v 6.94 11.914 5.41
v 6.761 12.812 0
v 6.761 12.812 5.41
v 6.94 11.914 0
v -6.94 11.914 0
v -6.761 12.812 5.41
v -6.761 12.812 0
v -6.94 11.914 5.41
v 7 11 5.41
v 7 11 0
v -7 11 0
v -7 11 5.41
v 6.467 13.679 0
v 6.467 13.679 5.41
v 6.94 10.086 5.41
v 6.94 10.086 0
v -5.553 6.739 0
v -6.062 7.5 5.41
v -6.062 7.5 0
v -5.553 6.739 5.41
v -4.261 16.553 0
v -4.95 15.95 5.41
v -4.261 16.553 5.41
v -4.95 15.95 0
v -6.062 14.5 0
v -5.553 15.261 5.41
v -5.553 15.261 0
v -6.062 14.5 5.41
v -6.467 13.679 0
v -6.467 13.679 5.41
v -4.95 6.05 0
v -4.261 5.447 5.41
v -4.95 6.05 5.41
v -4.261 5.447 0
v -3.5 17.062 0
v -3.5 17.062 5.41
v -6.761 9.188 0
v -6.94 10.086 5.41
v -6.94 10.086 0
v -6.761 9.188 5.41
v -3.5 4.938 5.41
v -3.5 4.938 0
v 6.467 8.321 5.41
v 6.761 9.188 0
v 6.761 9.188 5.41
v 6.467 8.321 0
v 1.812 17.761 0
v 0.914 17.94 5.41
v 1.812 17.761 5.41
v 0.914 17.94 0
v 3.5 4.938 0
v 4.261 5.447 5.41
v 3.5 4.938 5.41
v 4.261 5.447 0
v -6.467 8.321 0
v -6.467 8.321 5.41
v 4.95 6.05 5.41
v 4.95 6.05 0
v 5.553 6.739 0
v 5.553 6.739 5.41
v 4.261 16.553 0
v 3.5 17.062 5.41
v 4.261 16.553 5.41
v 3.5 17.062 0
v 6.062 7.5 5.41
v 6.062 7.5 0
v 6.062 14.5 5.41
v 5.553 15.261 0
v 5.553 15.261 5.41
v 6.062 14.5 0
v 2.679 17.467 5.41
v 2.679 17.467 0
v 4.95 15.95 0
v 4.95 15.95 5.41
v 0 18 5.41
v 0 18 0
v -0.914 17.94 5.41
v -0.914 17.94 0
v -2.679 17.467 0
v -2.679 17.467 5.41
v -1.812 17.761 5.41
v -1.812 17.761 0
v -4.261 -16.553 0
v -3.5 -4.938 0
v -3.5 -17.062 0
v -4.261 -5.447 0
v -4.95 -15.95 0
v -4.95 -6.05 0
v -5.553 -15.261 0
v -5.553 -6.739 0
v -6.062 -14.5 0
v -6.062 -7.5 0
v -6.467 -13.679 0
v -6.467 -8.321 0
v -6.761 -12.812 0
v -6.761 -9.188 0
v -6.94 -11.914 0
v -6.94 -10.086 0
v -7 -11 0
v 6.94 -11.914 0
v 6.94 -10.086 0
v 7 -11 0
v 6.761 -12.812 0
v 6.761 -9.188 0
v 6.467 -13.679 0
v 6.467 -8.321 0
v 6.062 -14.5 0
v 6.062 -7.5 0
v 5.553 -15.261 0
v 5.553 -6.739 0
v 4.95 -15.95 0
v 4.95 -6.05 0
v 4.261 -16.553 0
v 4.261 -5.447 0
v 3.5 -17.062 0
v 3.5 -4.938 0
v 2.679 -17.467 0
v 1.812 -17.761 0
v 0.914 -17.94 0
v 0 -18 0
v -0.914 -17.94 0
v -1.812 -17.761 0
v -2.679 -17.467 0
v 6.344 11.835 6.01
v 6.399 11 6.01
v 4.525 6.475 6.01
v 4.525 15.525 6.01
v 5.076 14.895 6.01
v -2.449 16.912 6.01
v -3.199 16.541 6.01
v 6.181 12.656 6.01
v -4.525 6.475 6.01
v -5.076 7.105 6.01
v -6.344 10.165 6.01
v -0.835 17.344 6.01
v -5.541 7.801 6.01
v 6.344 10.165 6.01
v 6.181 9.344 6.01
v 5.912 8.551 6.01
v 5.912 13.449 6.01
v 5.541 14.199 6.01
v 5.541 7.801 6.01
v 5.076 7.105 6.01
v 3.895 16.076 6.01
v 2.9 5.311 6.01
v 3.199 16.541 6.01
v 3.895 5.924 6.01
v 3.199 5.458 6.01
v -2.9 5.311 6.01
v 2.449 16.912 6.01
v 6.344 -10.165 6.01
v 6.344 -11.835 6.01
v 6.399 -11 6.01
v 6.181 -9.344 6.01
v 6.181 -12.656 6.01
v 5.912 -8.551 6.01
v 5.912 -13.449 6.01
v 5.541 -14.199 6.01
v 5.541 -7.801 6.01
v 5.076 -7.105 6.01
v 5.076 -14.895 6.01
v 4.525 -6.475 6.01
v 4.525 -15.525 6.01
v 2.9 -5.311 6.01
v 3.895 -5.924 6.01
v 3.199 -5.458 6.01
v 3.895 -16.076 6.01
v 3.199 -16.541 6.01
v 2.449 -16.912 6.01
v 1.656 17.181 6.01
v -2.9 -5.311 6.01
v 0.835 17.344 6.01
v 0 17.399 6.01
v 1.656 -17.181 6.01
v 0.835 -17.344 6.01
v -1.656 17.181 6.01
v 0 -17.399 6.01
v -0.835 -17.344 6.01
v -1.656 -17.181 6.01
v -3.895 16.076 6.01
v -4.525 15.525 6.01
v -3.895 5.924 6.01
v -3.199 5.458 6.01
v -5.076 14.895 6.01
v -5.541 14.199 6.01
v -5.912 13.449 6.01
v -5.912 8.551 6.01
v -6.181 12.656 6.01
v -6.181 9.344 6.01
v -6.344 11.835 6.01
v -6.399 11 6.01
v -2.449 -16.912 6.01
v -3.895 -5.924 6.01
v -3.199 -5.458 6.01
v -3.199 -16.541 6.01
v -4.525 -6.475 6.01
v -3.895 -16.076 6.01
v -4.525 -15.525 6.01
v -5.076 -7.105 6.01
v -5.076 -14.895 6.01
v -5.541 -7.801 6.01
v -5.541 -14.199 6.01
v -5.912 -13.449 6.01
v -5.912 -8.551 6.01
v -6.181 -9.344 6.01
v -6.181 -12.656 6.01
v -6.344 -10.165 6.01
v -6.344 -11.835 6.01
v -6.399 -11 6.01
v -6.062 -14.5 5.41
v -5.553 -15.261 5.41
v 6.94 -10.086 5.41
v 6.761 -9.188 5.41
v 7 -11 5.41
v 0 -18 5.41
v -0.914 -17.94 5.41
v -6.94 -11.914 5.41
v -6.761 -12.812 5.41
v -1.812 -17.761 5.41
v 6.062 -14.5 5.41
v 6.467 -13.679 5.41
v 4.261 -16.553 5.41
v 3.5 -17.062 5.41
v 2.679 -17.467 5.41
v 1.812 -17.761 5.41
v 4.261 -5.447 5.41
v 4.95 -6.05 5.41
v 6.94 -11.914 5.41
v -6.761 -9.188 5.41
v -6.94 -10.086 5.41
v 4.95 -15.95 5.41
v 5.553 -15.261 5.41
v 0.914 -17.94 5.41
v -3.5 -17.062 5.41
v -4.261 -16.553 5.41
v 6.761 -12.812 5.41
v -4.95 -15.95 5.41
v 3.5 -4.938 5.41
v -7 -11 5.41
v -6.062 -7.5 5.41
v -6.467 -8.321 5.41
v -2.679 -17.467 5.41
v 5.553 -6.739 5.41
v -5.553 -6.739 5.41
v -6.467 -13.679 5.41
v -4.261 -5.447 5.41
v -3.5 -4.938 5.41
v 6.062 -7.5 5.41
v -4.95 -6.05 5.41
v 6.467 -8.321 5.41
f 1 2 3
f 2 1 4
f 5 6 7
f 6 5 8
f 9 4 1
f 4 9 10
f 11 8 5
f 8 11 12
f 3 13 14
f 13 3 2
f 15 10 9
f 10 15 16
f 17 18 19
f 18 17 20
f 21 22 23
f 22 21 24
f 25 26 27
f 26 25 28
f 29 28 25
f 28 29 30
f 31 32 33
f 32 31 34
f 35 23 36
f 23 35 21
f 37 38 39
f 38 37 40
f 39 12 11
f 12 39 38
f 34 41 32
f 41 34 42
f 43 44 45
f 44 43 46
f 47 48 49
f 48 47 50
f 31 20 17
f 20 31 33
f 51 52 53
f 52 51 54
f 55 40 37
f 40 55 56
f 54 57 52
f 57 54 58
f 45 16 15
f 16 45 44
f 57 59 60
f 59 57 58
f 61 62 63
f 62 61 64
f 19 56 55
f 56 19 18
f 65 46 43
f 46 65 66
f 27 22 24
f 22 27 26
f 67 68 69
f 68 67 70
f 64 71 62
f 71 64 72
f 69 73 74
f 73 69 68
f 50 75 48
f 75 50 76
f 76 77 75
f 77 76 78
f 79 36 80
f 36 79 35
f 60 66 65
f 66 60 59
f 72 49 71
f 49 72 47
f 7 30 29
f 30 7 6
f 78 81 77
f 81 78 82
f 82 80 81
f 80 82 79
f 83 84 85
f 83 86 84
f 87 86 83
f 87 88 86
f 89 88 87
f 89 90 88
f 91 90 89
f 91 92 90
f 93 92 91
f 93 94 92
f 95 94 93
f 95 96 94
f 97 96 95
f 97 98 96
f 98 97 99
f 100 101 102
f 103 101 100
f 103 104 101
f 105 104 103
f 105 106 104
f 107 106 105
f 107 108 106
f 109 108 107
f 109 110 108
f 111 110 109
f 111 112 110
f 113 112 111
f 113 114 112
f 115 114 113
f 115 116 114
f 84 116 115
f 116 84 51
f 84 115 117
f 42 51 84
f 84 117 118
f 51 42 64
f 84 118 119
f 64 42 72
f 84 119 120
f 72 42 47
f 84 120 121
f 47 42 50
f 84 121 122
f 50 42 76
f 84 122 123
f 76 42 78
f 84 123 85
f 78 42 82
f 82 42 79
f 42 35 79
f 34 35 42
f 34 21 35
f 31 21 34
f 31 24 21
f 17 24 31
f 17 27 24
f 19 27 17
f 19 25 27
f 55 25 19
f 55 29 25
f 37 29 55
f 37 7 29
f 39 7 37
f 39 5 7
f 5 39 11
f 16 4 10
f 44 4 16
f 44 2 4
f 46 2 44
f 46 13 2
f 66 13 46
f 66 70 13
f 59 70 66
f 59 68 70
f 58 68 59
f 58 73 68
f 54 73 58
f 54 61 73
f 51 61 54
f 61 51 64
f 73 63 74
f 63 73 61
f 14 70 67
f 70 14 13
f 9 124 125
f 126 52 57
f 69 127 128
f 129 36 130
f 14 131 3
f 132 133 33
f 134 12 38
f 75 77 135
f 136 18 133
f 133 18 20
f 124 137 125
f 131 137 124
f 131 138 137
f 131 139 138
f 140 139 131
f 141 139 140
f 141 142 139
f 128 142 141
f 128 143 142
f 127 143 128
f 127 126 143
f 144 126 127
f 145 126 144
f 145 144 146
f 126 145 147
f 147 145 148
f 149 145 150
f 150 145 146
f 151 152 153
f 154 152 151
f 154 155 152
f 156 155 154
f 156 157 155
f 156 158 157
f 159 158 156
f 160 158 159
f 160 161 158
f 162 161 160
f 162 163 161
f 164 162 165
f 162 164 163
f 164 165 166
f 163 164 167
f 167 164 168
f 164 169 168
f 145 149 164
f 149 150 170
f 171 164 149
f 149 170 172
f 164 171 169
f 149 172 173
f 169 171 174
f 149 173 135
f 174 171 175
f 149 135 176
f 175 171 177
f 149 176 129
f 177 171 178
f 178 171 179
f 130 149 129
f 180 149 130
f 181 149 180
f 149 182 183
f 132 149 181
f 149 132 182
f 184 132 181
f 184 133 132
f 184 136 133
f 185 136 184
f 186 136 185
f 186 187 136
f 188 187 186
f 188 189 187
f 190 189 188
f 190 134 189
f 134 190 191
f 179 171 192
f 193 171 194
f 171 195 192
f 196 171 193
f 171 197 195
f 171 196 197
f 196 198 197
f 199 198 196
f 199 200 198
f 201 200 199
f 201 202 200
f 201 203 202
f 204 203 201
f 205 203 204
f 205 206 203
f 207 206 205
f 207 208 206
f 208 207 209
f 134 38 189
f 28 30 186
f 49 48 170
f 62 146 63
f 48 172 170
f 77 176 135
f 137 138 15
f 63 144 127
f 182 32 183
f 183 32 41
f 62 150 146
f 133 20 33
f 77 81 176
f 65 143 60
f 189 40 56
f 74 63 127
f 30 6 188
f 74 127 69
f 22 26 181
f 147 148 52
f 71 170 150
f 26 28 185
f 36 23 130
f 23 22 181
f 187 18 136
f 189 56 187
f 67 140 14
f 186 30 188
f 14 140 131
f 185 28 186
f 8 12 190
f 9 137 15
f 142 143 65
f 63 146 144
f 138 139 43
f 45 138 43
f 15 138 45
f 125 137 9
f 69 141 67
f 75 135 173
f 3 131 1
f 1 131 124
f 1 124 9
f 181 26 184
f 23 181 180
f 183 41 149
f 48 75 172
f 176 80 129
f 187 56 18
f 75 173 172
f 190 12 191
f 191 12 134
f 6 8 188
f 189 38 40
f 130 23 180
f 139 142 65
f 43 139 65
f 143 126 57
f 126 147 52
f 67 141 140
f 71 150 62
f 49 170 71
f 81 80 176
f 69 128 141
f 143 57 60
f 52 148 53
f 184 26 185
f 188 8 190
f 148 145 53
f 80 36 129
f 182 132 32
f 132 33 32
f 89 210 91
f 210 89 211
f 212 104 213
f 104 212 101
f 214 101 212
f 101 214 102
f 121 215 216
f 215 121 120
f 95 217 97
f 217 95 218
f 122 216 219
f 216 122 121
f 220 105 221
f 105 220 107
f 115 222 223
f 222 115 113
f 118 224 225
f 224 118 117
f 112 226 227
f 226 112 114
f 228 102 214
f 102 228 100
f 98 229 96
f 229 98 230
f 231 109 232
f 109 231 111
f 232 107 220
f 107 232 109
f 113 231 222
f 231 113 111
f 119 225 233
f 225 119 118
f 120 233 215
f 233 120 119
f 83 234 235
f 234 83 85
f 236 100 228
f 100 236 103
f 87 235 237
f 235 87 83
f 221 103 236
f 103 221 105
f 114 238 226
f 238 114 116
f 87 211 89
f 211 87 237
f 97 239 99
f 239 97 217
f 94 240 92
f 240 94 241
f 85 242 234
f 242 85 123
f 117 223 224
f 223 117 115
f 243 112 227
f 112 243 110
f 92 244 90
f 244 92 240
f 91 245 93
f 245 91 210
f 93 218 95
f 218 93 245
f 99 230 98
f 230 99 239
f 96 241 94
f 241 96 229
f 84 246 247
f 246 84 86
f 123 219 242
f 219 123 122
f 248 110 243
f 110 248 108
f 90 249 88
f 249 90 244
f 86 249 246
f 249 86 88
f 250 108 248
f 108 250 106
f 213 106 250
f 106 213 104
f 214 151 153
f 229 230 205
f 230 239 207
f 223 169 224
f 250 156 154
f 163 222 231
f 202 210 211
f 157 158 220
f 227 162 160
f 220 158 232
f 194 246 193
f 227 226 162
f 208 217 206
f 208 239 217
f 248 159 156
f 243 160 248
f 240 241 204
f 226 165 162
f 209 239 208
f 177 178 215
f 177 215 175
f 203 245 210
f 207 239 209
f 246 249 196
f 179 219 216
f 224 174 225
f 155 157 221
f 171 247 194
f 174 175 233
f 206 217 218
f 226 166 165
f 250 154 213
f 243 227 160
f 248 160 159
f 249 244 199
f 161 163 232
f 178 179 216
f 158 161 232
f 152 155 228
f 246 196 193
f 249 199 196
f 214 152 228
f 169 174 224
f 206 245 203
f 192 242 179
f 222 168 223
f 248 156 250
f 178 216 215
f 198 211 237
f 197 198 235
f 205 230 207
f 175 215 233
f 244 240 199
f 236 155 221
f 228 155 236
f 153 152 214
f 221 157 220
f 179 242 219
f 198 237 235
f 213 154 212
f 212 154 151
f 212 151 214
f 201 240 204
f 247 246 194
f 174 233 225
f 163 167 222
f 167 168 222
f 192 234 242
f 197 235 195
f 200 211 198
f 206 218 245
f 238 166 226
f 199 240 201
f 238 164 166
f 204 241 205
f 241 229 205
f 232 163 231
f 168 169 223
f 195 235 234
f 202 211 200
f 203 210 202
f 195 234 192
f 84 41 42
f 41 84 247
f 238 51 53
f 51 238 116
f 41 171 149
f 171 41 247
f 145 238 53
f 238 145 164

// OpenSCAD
// file: connector.scad
// Shared board-model geometry for the puzzle chess board.
//
// The cell, the pin and the platform all `include` this file so their
// mating dimensions can never drift apart. It defines named dimensions
// only (no top-level geometry), so including it renders nothing on its
// own. Three joints live here:
//   * cell <-> pin      : the dumbbell connector (bottom-loading grooves)
//   * cell <-> platform : the round central socket
//
// ---- Cell footprint ----
cell_size     = 50;   // square tile edge (mm) — a standard tournament cell
corner_radius = 5;    // radius of the rounded vertical corners

// ---- Clearance ----
// Fit control: every mating part differs from its cavity by this much on every
// face. A POSITIVE value is clearance (part shrunk — slides in with a gap); zero
// is a nominal (interference) fit that grips via FDM over-extrusion/roughness.
// Applied ONCE per joint — the cavity is drawn at its nominal size and the
// inserted part is offset by the gap. (Do not also resize the cavity; that
// double-counts the gap.)
// connector_gap is the default (platform joint); the pin uses its own pin_gap
// so the two joints can be tuned independently.
connector_gap = 0;  // platform disc: nominal (interference) fit, same as the pin.
                    // Clearances 0.1 / 0.05 / 0.02 per side all printed with
                    // side-to-side play, so grip on the nominal size instead.
pin_gap       = 0;     // pin-joint clearance per face — nominal (interference) fit,
                       // relies on FDM over-extrusion/roughness to grip firmly
// Deliberate gap left between two joined cells. The dumbbell's waist spans
// this gap, so small height differences between adjacent battlefield tiles
// read as natural seams rather than a visible step.
cell_gap      = 2;

// ---- Dumbbell connector: cell <-> pin ----
// A flat dumbbell-shaped tab lies in a pocket that is OPEN AT THE BOTTOM of
// each cell, so pins drop straight in (or out) from underneath the board —
// even for a tile in the middle of an assembled field, where the old
// side-sliding pin could never reach. Each cell captures one bulb of the
// dumbbell; the narrow waist passes through a slot at the cell's mid-edge,
// and because the bulb is wider than that slot the two cells cannot pull
// apart. All dimensions are the nominal cavity; the pin subtracts the gap.
bulb_radius  = 7;    // radius of each dumbbell head (14 mm across) — wider heads
                     //   give more shoulder behind the neck slot, resisting pull-out
neck_width   = 7;    // width of the waist — must be < 2*bulb_radius; wider = stronger
                     //   in shear, less likely to snap at the seam
groove_depth = 10;   // bulb-chamber centre, measured in from the cell edge; pulled a
                     //   touch deeper so a solid back wall remains behind the wider bulb
pin_thickness = 6;   // vertical (Z) extent of the flat tab — doubled for a much
                     //   stiffer, harder-to-snap connector
pin_top_chamfer    = 0.6;  // decorative bevel on the pin's TOP edge, matching the
                     // platform's top rim. The pin is modelled bevel-up; rotate it upside
                     // down for printing so the bevel lands on the bed. No effect on grip.
pin_bottom_chamfer = 0;    // bevel on the pin's bottom edge (0 = square)
// Vertical slack above the seated pin. Deliberately larger than the radial
// connector_gap: the pocket must be a touch DEEPER than the pin is thick so
// the pin can be pushed all the way in (its face flush with the board bottom)
// without the pocket roof stopping it short.
groove_clearance = 0.8;
// Pocket reaches from the bed (z = 0) up past the tab, leaving the cell body
// above it as a roof — set groove_clearance clear of the pin so it fully seats.
groove_height = pin_thickness + groove_clearance;
// Bulb-centre spacing on the pin: one groove_depth into each cell plus the
// seam gap, so a bulb lands dead-centre in each cell's chamber.
bulb_offset   = groove_depth + cell_gap / 2;

// ---- Central socket: cell <-> platform ----
// A round recess in the middle of the cell holds a separately printed
// platform (print it black or white) whose top finishes flush with the
// surrounding terrain plateau — the flat stage a piece stands on.
platform_radius  = 20;   // the platform disc (40 mm across) — clears a piece base
platform_height  = 4;    // its thickness / how deep it seats
platform_chamfer = 0;    // lead-in bevel on the platform's bottom edge (0 = straight
                         // wall, full radius top-to-bottom for maximum grip surface)
platform_top_chamfer = 0.6;  // decorative bevel on the platform's TOP (visible) edge,
                             // easing the rim where the stage meets the terrain plateau
                             // (like the pin's chamfer). Does not affect the socket grip.
socket_radius = platform_radius;                  // nominal cavity (disc carries the gap)
platform_fit_radius = platform_radius - connector_gap;  // friction fit in the cell
socket_depth  = platform_height + 0.2;            // seats flush or a hair below

$fn = 48;
// main file
// pin — the connector that joins two neighbouring cells. It is one of the
// three parts of the `board` model (the others are cell.scad and
// platform.scad).
//
// A flat dumbbell tab: one bulb seats in each cell's bottom-opening bulb
// chamber and the narrow waist spans the seam. Because each bulb is wider
// than the neck slot it passes through, the two cells cannot pull apart.
// Pins drop in (and out) from UNDER the board, so a tile in the middle of an
// assembled field can be added or removed without disturbing its neighbours.
//
// Prints flat on the bed, no supports. The pin is modelled with its decorative
// bevel on the TOP edge (matching the platform's top rim); rotate it upside
// down before slicing so that beveled edge lands on the bed.

include <connector.scad>

pin();

// The dumbbell is built as three CONVEX pieces (two bulbs + the waist), each
// chamfered on its own and then unioned. Chamfering the whole dumbbell at
// once would need a convex hull, which fills in the waist and makes the tab
// too wide to clear the cell's neck slot — so keep the pieces separate.
module pin() {
    br = bulb_radius - pin_gap;   // bulb, a hair under the chamber
    nw = neck_width  - 2 * pin_gap;  // waist, a hair under the neck slot
    union() {
        chamfered(pin_thickness) translate([0,  bulb_offset]) circle(r = br);
        chamfered(pin_thickness) translate([0, -bulb_offset]) circle(r = br);
        chamfered(pin_thickness) square([nw, 2 * bulb_offset], center = true);
    }
}

// Extrude a CONVEX 2D child to height h with a bevel on each end:
// pin_top_chamfer on the top and pin_bottom_chamfer on the bottom. Each bevel
// eases the perimeter inward. Convexity matters: a bevel is a hull of the full
// profile and an inset copy, which is only exact for convex shapes — which is
// why the dumbbell is built as three separate convex pieces, each chamfered on
// its own and then unioned.
module chamfered(h) {
    union() {
        // Straight full-profile middle between the two bevels.
        translate([0, 0, pin_bottom_chamfer])
            linear_extrude(h - pin_top_chamfer - pin_bottom_chamfer) children();
        // Bottom bevel.
        if (pin_bottom_chamfer > 0)
            hull() {
                linear_extrude(0.01) offset(delta = -pin_bottom_chamfer) children();
                translate([0, 0, pin_bottom_chamfer])
                    linear_extrude(0.01) children();
            }
        // Top bevel.
        if (pin_top_chamfer > 0)
            translate([0, 0, h - pin_top_chamfer])
                hull() {
                    linear_extrude(0.01) children();
                    translate([0, 0, pin_top_chamfer])
                        linear_extrude(0.01) offset(delta = -pin_top_chamfer) children();
                }
    }
}
